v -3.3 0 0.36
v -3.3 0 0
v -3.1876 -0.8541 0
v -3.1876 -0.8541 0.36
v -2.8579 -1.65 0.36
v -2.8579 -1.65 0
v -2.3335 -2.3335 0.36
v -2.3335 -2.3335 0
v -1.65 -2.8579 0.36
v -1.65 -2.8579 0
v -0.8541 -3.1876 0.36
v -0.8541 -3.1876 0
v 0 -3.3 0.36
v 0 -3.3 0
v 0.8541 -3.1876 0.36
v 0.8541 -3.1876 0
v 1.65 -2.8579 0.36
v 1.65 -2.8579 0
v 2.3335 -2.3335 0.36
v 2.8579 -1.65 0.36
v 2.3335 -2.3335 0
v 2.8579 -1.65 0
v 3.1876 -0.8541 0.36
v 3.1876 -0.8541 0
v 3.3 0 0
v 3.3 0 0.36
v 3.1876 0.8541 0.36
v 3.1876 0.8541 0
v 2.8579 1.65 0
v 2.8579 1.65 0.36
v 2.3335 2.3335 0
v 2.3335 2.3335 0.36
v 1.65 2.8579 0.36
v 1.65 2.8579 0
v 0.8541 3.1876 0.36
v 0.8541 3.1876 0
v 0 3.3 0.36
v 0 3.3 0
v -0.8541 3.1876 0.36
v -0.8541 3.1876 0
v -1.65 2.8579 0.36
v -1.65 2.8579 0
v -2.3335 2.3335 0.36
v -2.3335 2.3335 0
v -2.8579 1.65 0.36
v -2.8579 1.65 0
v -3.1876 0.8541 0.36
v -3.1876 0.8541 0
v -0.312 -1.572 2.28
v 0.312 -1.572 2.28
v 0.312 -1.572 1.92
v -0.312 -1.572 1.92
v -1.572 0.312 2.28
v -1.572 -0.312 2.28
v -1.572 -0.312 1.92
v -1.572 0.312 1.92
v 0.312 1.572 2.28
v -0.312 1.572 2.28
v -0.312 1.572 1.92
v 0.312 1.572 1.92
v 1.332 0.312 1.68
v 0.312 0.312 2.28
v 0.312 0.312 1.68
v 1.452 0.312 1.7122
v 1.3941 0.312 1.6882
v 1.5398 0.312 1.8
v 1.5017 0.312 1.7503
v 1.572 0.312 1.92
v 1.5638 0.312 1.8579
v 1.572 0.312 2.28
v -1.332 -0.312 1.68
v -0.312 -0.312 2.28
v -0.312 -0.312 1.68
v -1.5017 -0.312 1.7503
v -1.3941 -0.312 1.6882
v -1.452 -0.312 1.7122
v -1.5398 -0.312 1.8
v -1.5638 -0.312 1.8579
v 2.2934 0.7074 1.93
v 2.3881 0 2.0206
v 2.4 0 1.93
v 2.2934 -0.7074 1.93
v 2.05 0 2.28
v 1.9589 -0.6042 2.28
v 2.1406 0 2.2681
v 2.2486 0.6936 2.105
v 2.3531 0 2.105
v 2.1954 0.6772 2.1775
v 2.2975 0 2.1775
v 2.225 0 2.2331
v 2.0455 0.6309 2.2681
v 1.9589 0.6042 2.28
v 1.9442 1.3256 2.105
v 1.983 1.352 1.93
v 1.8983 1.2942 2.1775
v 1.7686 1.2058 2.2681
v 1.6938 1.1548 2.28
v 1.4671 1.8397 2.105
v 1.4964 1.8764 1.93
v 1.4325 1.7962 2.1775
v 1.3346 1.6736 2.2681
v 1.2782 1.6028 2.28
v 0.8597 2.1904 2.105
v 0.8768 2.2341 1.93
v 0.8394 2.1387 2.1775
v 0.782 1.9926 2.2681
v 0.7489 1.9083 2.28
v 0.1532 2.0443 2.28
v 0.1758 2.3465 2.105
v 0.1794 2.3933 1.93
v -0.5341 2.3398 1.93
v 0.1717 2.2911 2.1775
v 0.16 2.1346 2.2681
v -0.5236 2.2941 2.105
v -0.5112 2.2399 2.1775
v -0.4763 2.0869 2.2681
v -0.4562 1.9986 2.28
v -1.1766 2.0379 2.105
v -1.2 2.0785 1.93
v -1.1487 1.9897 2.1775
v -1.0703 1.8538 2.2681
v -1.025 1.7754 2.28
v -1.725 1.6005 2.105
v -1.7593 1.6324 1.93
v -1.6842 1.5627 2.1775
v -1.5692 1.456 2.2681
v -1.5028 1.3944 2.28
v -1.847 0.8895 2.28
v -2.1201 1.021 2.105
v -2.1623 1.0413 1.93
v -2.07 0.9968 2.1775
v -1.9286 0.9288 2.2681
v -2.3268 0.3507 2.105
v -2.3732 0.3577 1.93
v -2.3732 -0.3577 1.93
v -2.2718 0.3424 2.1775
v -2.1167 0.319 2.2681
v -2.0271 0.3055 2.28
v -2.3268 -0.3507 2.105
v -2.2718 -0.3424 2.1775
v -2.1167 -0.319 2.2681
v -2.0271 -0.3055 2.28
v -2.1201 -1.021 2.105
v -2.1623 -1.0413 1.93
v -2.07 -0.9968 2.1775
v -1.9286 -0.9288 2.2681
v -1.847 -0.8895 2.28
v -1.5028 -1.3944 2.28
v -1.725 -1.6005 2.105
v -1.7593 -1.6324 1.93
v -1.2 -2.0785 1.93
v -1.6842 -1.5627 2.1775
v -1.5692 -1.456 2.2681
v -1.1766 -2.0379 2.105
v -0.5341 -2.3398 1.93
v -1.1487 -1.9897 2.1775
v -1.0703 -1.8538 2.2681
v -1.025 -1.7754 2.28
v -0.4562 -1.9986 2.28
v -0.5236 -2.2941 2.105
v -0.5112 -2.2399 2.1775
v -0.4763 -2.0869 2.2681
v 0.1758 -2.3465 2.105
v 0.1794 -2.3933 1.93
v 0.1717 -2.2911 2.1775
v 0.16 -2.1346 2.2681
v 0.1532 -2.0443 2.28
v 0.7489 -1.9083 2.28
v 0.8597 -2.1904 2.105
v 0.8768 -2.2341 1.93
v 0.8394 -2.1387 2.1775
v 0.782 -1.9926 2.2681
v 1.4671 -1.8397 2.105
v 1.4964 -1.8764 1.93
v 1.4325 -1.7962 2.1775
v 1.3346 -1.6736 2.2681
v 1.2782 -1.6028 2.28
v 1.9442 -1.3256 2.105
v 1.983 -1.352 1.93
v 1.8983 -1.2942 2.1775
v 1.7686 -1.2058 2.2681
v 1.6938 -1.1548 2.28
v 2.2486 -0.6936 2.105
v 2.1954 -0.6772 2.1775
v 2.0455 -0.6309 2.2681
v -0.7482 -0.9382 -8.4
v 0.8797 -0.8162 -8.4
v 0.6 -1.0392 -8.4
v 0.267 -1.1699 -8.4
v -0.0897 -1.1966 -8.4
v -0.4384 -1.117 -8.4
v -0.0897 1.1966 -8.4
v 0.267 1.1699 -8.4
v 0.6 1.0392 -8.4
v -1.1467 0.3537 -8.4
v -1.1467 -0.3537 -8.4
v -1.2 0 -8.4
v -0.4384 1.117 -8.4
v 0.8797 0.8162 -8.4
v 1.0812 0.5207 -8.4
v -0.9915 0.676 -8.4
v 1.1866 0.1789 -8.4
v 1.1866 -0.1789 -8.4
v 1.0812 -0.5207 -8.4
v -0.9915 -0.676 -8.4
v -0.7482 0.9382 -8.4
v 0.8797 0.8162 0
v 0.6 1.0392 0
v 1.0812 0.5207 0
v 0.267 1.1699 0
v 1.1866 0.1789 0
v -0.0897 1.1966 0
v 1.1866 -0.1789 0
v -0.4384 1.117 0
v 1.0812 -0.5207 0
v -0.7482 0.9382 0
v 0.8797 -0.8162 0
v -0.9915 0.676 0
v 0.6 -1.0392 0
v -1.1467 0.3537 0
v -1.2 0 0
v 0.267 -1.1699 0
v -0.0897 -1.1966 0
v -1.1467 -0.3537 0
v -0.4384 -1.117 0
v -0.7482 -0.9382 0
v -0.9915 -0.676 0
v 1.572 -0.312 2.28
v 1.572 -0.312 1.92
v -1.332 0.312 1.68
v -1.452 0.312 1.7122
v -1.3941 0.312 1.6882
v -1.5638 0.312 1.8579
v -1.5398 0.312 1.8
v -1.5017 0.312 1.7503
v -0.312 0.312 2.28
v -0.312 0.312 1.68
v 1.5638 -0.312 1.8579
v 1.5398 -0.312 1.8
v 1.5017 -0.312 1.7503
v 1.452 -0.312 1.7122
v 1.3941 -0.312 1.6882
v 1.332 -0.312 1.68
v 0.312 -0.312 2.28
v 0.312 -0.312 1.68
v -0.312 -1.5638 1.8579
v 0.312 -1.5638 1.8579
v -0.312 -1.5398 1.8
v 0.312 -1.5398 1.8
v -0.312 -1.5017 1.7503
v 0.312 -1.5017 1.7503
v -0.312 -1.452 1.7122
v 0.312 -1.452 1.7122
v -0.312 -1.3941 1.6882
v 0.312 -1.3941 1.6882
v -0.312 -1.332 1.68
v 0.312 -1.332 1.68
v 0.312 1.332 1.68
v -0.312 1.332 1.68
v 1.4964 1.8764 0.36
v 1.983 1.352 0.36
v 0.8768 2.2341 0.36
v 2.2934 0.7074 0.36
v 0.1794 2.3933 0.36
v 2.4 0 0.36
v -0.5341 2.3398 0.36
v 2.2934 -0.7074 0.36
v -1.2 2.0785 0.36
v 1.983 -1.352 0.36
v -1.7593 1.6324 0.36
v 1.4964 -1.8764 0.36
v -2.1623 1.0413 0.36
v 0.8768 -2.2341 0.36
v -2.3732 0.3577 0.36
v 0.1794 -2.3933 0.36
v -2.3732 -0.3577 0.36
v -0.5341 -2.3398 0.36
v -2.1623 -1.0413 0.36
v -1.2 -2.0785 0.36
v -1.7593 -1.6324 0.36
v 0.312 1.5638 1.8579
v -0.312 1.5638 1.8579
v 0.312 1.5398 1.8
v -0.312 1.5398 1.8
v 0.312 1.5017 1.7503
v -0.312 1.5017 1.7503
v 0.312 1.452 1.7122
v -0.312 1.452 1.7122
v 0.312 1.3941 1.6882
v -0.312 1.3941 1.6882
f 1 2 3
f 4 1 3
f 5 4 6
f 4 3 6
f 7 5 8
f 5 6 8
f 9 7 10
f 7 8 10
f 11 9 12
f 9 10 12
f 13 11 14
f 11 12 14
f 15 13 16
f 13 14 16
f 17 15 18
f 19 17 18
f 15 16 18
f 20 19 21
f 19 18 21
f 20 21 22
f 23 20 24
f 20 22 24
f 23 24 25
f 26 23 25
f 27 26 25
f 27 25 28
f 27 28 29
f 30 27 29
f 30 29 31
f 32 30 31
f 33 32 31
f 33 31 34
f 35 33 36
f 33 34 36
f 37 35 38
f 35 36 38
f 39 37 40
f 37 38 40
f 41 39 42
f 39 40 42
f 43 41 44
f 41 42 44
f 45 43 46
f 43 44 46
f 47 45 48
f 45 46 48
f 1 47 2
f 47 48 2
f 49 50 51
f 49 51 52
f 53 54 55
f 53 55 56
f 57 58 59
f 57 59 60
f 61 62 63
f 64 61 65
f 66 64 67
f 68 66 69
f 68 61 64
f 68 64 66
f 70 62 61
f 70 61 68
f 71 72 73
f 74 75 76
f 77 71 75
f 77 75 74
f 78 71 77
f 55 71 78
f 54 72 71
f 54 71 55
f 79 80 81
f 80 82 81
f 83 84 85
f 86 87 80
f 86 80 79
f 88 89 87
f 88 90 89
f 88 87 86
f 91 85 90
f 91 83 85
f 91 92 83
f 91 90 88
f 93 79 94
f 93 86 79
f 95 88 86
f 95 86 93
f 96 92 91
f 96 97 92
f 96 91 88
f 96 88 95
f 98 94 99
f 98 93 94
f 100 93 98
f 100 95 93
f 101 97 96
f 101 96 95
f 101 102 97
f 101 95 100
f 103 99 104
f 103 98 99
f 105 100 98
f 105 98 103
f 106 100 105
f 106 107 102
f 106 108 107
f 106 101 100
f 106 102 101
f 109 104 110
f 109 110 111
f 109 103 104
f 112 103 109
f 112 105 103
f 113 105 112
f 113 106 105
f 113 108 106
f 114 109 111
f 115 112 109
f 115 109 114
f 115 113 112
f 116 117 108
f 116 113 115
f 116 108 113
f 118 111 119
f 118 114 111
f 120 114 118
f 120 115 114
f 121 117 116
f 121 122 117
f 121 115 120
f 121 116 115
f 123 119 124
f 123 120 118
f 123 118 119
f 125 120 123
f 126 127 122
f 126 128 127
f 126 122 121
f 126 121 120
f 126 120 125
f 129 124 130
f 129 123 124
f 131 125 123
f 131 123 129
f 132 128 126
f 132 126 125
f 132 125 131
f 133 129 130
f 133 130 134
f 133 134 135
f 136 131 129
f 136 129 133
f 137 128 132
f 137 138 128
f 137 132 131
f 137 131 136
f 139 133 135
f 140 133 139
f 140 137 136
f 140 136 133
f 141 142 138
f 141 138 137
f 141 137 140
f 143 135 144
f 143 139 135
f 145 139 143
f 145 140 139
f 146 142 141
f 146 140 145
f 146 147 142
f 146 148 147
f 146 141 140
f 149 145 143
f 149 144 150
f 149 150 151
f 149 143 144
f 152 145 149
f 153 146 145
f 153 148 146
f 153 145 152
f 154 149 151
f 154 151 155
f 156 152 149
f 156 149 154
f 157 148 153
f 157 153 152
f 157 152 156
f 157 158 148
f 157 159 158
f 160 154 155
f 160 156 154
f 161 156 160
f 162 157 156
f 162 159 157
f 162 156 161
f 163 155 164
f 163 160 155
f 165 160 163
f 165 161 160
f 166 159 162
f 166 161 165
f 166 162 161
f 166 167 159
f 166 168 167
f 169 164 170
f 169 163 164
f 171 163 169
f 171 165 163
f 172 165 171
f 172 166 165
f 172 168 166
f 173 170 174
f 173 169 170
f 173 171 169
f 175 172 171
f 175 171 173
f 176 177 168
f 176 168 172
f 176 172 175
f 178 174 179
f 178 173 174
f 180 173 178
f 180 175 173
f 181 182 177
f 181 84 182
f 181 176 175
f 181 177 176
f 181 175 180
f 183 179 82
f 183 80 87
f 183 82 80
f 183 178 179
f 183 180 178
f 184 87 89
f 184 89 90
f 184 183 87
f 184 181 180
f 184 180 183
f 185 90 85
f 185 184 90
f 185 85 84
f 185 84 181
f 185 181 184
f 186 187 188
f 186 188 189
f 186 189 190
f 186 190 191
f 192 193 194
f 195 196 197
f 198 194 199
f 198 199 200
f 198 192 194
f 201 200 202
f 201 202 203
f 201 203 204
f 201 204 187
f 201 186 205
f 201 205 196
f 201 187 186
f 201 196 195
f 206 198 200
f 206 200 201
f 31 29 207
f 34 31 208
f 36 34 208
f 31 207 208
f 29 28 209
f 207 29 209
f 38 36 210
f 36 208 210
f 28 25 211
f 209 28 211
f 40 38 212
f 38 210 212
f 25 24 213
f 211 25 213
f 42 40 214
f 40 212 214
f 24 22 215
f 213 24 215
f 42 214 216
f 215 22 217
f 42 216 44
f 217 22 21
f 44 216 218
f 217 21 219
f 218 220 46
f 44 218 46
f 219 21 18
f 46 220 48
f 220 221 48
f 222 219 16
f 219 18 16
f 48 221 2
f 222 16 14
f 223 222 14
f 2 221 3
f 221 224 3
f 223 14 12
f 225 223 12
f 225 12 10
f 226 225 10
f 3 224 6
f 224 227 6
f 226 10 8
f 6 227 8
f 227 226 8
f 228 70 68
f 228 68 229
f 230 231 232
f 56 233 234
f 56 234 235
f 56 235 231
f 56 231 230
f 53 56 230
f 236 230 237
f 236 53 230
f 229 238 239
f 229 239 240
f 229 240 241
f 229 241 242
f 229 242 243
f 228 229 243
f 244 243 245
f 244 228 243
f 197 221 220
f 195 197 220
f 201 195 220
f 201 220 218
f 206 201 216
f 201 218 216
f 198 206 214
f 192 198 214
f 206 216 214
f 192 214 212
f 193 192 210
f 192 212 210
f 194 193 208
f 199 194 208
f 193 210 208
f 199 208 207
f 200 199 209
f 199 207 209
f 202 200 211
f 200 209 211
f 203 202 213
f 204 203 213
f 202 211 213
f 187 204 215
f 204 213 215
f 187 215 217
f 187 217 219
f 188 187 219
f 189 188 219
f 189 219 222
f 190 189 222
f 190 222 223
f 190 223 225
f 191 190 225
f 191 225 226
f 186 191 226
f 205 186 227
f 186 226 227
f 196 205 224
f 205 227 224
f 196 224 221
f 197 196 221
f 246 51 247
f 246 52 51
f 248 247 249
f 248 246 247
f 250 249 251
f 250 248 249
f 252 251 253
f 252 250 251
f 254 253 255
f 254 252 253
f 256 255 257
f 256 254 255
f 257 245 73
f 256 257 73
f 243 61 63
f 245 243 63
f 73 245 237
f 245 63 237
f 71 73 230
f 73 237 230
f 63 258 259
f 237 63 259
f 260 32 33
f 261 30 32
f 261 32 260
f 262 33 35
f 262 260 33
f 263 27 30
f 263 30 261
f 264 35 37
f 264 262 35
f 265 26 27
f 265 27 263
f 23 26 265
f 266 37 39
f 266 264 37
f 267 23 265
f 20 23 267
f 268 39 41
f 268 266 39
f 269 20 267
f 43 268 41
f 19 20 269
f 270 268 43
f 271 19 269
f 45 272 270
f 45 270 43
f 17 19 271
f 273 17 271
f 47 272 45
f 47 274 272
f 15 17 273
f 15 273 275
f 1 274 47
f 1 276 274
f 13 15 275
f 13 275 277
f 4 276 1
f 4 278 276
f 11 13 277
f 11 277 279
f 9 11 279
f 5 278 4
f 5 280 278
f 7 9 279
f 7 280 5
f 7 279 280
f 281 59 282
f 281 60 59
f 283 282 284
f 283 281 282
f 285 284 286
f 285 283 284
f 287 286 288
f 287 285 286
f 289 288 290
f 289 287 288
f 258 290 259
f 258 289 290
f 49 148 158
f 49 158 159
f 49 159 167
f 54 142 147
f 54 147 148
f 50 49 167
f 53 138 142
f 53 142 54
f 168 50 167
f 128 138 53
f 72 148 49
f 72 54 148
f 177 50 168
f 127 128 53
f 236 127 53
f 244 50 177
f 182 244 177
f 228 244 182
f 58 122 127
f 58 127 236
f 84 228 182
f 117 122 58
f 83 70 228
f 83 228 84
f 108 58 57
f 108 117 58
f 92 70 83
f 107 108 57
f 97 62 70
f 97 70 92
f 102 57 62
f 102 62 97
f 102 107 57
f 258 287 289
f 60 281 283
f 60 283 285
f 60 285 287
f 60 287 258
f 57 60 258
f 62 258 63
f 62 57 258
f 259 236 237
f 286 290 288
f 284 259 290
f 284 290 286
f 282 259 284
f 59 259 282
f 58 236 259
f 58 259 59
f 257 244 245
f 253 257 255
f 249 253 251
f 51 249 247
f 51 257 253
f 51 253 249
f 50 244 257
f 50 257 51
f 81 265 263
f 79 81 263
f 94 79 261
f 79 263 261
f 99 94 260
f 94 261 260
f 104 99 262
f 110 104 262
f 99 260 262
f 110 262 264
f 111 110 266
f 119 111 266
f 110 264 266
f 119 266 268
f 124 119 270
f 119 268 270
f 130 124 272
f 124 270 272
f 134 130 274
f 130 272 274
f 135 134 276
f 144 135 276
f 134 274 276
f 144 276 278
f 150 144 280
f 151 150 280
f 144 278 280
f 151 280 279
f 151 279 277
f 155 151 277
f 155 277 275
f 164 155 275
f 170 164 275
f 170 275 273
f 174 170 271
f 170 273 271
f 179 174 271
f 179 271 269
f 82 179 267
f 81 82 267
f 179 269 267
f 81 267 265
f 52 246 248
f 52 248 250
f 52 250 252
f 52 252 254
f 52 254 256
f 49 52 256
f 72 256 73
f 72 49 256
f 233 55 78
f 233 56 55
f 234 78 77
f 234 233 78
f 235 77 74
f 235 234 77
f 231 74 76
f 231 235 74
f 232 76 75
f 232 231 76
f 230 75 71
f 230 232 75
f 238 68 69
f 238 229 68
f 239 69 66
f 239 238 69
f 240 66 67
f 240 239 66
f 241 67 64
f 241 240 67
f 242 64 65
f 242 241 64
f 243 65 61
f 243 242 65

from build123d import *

# Parameters (mm, degrees)
ESQUISSE1_R             = 3.3
BOSS_EXTRU_1_DEPTH      = 0.36
ESQUISSE2_R             = 2.4
BOSS_EXTRU_2_DEPTH      = 1.92
ESQUISSE3_R             = 1.2
BOSS_EXTRU_3_DEPTH      = 8.4
CONG_1_R                = 0.35
ENL_V_MAT_EXTRU_1_DEPTH = 0.6
CONG_2_R                = 0.24


with BuildPart() as part:
    # Esquisse1 → Boss.-Extru.1 (new body)
    with BuildSketch(Plane.XY):
        with Locations(Location((0, 0, 0), (0, 0, 180))):
            Circle(ESQUISSE1_R)
    extrude(amount=BOSS_EXTRU_1_DEPTH)

    # Esquisse2 → Boss.-Extru.2 (add)
    with BuildSketch(Plane.XY.offset(0.36)):
        Circle(ESQUISSE2_R)
    extrude(amount=BOSS_EXTRU_2_DEPTH)

    # Esquisse3 → Boss.-Extru.3 (add)
    with BuildSketch(Plane(origin=(0, 0, 0), x_dir=(-1, 0, 0), z_dir=(0, 0, -1))):
        Circle(ESQUISSE3_R)
    extrude(amount=BOSS_EXTRU_3_DEPTH)

    # Congé1
    cong_1_edges = [part.edges().sort_by_distance(p)[0] for p in [
        (-2.4, 0, 2.28),
    ]]
    fillet(cong_1_edges, radius=CONG_1_R)

    # Esquisse4 → Enlèv. mat.-Extru.1 (cut)
    with BuildSketch(Plane.XY.offset(2.28)):
        Polygon((-1.572, -0.312), (-1.572, 0.312), (-0.312, 0.312), (-0.312, 1.572), (0.312, 1.572), (0.312, 0.312), (1.572, 0.312), (1.572, -0.312), (0.312, -0.312), (0.312, -1.572), (-0.312, -1.572), (-0.312, -0.312), align=None)
    extrude(amount=-ENL_V_MAT_EXTRU_1_DEPTH, mode=Mode.SUBTRACT)

    # Congé2
    cong_2_edges = [part.edges().sort_by_distance(p)[0] for p in [
        (-1.572, 0, 1.68),
        (0, 1.572, 1.68),
        (1.572, 0, 1.68),
        (0, -1.572, 1.68),
    ]]
    fillet(cong_2_edges, radius=CONG_2_R)


solid = part.part
